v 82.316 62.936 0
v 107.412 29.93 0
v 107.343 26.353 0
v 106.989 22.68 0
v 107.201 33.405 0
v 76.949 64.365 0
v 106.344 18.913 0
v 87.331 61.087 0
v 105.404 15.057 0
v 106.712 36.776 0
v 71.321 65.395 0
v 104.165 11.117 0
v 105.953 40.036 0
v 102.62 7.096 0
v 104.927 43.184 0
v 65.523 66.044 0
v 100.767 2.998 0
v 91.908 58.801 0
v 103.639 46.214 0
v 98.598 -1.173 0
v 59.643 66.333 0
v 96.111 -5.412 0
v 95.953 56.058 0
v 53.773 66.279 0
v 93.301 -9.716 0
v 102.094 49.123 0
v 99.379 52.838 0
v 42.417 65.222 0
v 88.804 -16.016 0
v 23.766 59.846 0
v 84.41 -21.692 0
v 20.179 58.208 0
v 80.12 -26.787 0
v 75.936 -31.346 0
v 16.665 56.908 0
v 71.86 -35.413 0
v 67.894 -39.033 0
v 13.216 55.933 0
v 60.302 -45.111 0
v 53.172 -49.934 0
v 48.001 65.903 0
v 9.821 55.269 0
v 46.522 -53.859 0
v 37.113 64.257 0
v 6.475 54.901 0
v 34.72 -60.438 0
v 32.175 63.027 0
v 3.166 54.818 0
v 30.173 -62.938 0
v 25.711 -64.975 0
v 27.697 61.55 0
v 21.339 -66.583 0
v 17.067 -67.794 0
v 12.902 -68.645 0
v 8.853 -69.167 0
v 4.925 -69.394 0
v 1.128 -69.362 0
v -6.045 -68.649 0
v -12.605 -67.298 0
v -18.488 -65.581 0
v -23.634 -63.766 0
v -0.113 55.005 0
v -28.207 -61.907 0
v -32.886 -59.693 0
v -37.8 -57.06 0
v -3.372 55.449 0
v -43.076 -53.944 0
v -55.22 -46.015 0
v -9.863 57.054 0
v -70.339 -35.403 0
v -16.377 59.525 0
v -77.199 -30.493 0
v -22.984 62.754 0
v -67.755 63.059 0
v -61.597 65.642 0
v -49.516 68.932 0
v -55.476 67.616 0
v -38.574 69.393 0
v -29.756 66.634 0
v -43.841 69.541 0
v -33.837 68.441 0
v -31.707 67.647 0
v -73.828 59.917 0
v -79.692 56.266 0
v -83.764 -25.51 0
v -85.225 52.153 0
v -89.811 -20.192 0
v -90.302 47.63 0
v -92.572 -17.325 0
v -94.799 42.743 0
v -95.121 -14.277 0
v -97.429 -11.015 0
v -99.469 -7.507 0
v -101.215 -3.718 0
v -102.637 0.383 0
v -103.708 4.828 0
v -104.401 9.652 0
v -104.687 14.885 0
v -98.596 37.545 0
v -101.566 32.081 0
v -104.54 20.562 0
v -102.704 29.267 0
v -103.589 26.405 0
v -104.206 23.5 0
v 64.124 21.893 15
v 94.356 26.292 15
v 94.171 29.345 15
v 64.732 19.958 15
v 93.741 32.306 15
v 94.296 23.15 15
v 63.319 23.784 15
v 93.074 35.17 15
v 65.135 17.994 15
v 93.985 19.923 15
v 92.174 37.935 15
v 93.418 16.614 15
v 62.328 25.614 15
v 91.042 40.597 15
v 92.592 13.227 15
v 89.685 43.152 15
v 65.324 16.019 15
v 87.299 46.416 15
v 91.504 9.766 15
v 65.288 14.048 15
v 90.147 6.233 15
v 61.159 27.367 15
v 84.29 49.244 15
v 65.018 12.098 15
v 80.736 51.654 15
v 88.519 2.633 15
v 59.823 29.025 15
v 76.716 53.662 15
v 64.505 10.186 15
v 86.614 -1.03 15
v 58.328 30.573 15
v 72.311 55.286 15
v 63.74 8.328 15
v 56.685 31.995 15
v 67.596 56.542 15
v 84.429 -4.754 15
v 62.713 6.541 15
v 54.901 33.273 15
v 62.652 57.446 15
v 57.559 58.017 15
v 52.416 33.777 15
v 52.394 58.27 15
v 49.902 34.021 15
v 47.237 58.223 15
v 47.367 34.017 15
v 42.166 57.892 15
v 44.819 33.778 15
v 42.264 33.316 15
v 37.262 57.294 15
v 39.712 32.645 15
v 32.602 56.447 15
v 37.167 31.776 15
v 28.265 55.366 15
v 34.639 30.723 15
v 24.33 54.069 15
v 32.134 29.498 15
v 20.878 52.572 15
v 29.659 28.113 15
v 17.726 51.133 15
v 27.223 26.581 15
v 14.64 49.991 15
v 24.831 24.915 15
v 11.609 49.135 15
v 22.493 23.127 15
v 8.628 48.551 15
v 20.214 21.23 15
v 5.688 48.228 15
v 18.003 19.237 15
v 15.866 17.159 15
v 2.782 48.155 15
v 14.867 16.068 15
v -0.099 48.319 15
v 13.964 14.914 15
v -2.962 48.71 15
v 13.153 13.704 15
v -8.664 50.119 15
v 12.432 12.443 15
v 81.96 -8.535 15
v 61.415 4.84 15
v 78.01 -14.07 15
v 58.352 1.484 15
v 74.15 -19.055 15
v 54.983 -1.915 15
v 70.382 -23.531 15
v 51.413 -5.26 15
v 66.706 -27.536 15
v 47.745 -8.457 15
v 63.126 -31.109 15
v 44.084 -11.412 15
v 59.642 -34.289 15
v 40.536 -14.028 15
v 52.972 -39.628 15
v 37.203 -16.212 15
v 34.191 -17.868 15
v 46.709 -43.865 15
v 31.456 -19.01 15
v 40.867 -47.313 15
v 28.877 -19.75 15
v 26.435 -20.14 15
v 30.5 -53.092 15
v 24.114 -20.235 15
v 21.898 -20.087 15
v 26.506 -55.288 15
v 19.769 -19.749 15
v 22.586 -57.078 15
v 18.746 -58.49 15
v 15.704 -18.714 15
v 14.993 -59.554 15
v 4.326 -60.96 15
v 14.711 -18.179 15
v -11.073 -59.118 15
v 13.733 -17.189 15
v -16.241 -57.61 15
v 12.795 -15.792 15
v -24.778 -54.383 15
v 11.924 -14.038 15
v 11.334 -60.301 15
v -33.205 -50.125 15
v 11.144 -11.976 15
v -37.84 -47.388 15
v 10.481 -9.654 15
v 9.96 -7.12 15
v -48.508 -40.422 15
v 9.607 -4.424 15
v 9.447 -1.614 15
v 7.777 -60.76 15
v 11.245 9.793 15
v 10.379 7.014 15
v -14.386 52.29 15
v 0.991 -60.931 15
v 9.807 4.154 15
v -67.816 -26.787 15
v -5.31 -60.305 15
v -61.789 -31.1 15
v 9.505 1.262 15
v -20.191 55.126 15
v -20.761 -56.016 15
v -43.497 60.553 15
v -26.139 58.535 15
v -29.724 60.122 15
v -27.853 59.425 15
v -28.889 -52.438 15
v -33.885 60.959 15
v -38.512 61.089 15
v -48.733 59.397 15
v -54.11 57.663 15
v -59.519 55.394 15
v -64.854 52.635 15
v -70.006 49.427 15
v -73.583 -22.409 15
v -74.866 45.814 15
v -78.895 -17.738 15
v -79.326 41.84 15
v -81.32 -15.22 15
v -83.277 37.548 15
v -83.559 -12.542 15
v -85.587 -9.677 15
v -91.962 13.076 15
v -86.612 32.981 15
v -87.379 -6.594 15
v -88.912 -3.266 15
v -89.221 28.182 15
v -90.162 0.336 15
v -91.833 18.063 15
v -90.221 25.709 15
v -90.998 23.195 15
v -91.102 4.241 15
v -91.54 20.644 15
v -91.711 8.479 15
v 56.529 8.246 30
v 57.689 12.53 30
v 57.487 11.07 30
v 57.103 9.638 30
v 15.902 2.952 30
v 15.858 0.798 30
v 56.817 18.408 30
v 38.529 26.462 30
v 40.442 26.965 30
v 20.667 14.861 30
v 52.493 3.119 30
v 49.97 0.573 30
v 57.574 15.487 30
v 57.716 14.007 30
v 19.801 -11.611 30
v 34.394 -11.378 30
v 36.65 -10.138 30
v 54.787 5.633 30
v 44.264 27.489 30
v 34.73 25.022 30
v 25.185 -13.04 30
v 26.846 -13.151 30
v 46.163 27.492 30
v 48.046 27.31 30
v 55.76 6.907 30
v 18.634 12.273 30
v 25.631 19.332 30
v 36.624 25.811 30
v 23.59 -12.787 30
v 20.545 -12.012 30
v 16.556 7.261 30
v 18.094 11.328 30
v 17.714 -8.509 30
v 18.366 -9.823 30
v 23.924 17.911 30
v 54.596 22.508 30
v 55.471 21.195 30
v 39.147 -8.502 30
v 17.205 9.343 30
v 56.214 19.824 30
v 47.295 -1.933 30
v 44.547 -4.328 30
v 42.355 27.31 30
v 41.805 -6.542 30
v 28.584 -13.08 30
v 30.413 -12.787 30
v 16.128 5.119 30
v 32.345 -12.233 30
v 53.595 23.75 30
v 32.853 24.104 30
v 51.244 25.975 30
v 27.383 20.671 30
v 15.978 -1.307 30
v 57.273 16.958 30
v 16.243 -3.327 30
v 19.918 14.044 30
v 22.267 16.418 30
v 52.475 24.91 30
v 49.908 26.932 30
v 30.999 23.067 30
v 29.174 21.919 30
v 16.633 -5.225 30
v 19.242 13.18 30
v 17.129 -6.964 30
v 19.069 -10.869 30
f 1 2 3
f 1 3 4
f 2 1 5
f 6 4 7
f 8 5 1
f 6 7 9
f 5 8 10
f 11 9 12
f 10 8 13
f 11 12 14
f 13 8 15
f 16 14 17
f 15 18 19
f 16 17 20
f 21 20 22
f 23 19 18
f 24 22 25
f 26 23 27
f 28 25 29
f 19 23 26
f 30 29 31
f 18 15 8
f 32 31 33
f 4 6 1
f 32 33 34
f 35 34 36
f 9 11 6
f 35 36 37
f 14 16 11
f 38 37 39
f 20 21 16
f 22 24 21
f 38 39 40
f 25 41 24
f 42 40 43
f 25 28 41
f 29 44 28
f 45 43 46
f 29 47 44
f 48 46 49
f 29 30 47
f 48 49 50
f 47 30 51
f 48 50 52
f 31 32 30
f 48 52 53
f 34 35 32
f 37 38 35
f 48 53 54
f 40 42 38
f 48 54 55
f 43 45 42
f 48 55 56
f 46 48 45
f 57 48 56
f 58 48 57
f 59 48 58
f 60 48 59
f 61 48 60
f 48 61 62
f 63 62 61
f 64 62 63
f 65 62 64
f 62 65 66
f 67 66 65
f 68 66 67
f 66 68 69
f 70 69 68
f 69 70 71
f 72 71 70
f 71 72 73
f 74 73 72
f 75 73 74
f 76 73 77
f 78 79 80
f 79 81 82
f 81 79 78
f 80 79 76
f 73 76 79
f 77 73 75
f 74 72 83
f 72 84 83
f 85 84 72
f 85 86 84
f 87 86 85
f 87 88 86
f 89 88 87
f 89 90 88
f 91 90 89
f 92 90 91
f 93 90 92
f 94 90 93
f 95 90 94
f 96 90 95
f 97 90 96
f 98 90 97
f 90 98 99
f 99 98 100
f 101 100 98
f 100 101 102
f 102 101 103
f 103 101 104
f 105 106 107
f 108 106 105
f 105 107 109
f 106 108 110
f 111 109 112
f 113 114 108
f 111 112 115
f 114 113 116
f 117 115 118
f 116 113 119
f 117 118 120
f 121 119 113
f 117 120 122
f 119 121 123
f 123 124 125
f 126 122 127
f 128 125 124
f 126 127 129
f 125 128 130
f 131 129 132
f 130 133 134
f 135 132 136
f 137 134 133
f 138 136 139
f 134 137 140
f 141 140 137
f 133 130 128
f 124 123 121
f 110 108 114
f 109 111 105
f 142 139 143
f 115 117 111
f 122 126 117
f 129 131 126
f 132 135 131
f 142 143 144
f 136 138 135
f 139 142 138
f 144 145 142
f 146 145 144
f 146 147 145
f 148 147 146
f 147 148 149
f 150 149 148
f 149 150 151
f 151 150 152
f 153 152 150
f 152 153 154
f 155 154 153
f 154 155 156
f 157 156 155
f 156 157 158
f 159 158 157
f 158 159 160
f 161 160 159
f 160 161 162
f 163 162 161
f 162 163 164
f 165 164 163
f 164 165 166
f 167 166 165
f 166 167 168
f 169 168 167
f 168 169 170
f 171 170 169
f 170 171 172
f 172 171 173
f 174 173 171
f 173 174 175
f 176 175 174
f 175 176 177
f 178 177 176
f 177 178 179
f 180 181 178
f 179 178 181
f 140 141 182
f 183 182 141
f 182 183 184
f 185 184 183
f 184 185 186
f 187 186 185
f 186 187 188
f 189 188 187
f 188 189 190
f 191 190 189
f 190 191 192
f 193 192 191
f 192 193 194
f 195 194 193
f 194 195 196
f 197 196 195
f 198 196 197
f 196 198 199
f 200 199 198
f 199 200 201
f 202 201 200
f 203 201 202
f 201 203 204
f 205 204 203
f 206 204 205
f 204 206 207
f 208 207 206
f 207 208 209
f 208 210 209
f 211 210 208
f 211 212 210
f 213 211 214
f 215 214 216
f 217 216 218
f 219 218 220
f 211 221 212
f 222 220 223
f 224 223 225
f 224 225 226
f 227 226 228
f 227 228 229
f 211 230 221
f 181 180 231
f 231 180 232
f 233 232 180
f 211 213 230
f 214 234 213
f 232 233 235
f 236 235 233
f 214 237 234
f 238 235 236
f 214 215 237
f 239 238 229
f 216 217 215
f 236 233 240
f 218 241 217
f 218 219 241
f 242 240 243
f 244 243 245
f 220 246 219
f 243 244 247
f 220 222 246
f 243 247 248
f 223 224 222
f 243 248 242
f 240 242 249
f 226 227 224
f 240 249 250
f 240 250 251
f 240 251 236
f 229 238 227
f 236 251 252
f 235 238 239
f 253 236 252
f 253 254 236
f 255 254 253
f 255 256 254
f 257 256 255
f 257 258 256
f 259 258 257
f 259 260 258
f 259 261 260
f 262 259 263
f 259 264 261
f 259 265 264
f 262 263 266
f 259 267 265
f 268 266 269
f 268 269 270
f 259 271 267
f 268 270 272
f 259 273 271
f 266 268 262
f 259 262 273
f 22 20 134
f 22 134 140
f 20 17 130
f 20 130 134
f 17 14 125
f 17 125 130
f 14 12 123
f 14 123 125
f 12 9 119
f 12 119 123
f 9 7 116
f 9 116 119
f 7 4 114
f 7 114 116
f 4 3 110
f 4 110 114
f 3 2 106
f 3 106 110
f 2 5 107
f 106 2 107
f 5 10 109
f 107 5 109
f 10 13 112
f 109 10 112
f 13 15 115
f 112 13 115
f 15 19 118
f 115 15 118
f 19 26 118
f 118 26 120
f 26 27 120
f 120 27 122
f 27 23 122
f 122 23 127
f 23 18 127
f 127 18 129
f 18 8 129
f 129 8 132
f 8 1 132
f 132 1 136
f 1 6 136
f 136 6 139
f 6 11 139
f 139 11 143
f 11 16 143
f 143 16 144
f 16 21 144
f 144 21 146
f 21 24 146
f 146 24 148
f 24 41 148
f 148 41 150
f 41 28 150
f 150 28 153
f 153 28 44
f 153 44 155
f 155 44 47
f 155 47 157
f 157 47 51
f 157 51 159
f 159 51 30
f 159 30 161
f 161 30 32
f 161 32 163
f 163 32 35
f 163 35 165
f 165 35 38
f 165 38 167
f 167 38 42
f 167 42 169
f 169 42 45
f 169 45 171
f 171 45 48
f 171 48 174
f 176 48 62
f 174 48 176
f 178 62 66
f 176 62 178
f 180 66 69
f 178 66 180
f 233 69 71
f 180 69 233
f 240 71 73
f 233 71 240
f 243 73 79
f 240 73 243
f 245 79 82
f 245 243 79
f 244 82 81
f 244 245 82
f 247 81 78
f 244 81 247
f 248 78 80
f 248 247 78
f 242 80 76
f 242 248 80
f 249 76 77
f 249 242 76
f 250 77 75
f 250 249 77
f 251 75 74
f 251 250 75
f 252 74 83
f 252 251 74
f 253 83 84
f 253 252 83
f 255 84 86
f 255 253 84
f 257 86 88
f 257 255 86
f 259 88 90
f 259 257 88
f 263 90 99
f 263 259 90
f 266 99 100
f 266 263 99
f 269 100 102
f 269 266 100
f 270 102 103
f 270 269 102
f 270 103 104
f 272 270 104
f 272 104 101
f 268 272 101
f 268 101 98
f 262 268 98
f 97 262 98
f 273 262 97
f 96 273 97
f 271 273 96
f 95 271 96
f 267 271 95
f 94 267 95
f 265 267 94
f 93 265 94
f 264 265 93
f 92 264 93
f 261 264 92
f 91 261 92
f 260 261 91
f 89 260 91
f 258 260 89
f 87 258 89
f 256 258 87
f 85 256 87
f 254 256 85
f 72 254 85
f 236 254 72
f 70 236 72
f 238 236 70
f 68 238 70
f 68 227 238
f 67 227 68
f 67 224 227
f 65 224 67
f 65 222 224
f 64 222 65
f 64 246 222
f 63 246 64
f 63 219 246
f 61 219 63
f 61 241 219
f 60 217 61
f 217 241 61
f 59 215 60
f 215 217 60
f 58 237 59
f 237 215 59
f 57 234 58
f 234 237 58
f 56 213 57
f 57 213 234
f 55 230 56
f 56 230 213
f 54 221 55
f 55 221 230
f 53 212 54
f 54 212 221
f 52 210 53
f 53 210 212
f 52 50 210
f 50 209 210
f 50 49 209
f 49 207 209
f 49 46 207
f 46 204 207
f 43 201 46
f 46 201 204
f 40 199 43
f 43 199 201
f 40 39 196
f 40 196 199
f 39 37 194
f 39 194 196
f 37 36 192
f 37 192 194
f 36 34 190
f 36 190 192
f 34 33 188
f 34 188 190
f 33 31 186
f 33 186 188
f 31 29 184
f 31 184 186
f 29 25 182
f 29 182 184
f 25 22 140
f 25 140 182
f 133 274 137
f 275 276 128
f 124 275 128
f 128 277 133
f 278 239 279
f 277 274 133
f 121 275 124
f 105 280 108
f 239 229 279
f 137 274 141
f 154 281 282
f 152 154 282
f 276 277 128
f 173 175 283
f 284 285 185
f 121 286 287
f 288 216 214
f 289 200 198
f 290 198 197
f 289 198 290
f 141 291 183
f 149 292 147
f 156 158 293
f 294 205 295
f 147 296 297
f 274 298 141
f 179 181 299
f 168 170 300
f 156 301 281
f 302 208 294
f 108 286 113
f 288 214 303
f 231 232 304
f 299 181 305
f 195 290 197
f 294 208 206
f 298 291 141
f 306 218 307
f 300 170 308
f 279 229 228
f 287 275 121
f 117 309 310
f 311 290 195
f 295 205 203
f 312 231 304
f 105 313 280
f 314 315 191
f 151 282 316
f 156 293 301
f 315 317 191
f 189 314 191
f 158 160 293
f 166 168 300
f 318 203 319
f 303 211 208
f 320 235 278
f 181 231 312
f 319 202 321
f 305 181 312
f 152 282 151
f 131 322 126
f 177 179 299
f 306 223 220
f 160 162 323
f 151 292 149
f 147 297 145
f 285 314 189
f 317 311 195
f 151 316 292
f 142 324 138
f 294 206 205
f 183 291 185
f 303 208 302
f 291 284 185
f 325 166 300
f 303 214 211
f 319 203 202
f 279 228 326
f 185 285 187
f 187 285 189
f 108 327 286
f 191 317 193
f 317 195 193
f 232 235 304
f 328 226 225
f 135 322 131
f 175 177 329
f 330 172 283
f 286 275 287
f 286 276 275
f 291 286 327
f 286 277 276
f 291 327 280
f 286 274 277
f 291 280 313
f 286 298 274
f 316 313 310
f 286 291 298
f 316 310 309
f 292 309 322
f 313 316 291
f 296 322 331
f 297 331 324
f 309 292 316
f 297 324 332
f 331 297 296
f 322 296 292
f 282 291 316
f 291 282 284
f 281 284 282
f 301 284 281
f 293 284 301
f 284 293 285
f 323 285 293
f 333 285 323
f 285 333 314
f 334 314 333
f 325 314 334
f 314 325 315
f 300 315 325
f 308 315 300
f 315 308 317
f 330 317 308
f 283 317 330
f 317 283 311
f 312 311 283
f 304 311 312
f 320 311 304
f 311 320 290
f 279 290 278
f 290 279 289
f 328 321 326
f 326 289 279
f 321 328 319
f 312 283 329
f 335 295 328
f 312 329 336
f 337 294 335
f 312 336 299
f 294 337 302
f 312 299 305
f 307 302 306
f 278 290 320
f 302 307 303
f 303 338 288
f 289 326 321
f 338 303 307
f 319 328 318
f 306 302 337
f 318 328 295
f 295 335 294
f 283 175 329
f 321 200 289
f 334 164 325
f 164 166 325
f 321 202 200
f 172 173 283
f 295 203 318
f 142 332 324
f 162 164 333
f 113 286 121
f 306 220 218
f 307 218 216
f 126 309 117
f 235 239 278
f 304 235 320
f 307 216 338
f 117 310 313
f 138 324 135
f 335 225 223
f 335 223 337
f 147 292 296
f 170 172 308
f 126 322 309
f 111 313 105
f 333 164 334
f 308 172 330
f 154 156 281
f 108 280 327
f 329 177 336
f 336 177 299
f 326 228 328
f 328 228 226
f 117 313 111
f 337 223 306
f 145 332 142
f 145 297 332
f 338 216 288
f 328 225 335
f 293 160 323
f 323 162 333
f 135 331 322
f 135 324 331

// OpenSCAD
// file: hill-4.scad
use <hillpolygon.scad>

% translate([0,0,155/2]) cube(size=[240, 153, 155], center=true); 

hill4();

module hill4() {
   hillFromPolygon(angle=25) hill4Polygon();
}

// Note: There is something slightly amiss with this polygon, resulting hill ends up with two
//       volumes (?).
module hill4Polygon() {
   // Apologies for the hackish adjustments ... just wanted to get the job done!
   translate([-10,0,0]) rotate([0,0,55]) translate([75,-10,0]) scale([0.8,0.8]) 
      polygon(points=
         [[-140.478, 124.045], [-137.230, 125.810], [-133.814, 127.261],
         [-130.249, 128.407], [-126.551, 129.260], [-118.827, 130.135],
         [-110.782, 129.975], [-102.554, 128.873], [-94.282, 126.918],
         [-86.104, 124.202], [-78.161, 120.815], [-70.590, 116.849],
         [-63.530, 112.395], [-57.120, 107.543], [-51.500, 102.384],
         [-46.807, 97.010], [-43.182, 91.511], [-40.761, 85.978], [-40.047,
         83.228], [-39.685, 80.503], [-38.803, 70.788], [-37.372, 61.707],
         [-35.232, 53.266], [-32.221, 45.469], [-30.339, 41.813], [-28.180,
         38.321], [-25.722, 34.993], [-22.947, 31.830], [-19.833, 28.831],
         [-16.361, 25.998], [-12.511, 23.332], [-8.262, 20.833], [-3.699,
         18.030], [1.024, 14.503], [5.824, 10.330], [10.615, 5.590],
         [15.315, 0.361], [19.839, -5.279], [24.103, -11.252], [28.023,
         -17.479], [31.515, -23.882], [34.496, -30.382], [36.880, -36.903],
         [38.583, -43.364], [39.523, -49.689], [39.615, -55.798], [38.774,
         -61.614], [36.917, -67.058], [35.046, -70.725], [32.867, -74.217],
         [30.379, -77.524], [27.585, -80.639], [24.484, -83.556], [21.077,
         -86.264], [17.366, -88.758], [13.350, -91.029], [9.031, -93.069],
         [4.409, -94.871], [-0.514, -96.427], [-5.739, -97.729], [-11.264,
         -98.769], [-17.089, -99.539], [-23.213, -100.032], [-29.635,
         -100.240], [-39.310, -100.153], [-48.272, -99.722], [-56.565,
         -98.983], [-64.233, -97.967], [-71.320, -96.710], [-77.870,
         -95.245], [-89.537, -91.828], [-99.587, -87.986], [-108.374,
         -83.990], [-123.572, -76.623], [-129.392, -73.760], [-134.677,
         -70.651], [-139.458, -67.328], [-143.761, -63.822], [-147.618,
         -60.167], [-151.056, -56.395], [-154.105, -52.536], [-156.794,
         -48.625], [-161.207, -40.769], [-164.527, -33.084], [-166.987,
         -25.828], [-168.818, -19.258], [-170.193, -13.243], [-171.281,
         -6.864], [-172.108, 0.055], [-172.700, 7.691], [-173.288,
         25.811], [-173.262, 48.900], [-173.153, 59.445], [-172.757,
         69.740], [-171.648, 79.745], [-170.692, 84.627], [-169.398,
         89.422], [-167.713, 94.124], [-165.583, 98.729], [-162.955,
         103.233], [-159.776, 107.629], [-155.992, 111.913], [-151.550,
         116.081], [-146.396, 120.126], [-140.478, 124.045]]
      , paths=
         [[0, 1, 2, 3, 4, 5, 6, 7, 8, 9, 10, 11, 12, 13, 14, 15, 16, 17,
         18, 19, 20, 21, 22, 23, 24, 25, 26, 27, 28, 29, 30, 31, 32, 33,
         34, 35, 36, 37, 38, 39, 40, 41, 42, 43, 44, 45, 46, 47, 48, 49,
         50, 51, 52, 53, 54, 55, 56, 57, 58, 59, 60, 61, 62, 63, 64, 65,
         66, 67, 68, 69, 70, 71, 72, 73, 74, 75, 76, 77, 78, 79, 80, 81,
         82, 83, 84, 85, 86, 87, 88, 89, 90, 91, 92, 93, 94, 95, 96, 97,
         98, 99, 100, 101, 102, 103, 104, 0]]
    );}
// file: hill-5.scad
use <hillpolygon.scad>;

% translate([0,0,155/2]) cube(size=[240, 153, 155], center=true);

hill5();

module hill5() {
   hillFromPolygon(angle=25) hill5Polygon();
}

module hill5Polygon() {
	rotate([0,0,30]) translate([55,-15,0])
  polygon(points=
    [[-39.685, 80.503], [-33.602, 77.830], [-27.700, 74.829], [-22.013, 71.501], [-16.577, 67.848], [-11.425, 63.870], [-6.592, 59.569], [-2.114, 54.944], [1.976, 49.998], [5.642, 44.731], [8.851, 39.145], [11.567, 33.240], [13.756, 27.017], [15.384, 20.477], [16.415, 13.623], [16.815, 6.453], [16.549, -1.030], [14.055, -7.770], [11.144, -14.347], [7.855, -20.711], [4.224, -26.811], [0.290, -32.597], [-3.911, -38.020], [-8.340, -43.029], [-12.960, -47.574], [-17.734, -51.605], [-22.624, -55.073], [-27.593, -57.926], [-32.602, -60.115], [-37.615, -61.590], [-42.594, -62.300], [-47.502, -62.196], [-52.300, -61.228], [-61.971, -57.963], [-71.871, -53.933], [-81.720, -49.278], [-91.235, -44.137], [-100.137, -38.652], [-108.144, -32.964], [-114.977, -27.212], [-120.353, -21.538], [-124.325, -15.847], [-127.224, -9.973], [-129.190, -3.949], [-130.364, 2.191], [-130.884, 8.412], [-130.892, 14.682], [-129.929, 27.234], [-128.983, 30.724], [-126.888, 34.853], [-123.755, 39.481], [-119.698, 44.465], [-114.828, 49.664], [-109.258, 54.935], [-103.099, 60.138], [-96.463, 65.131], [-89.464, 69.772], [-82.212, 73.919], [-74.820, 77.431], [-67.400, 80.166], [-60.065, 81.982], [-52.926, 82.738], [-49.465, 82.674], [-46.095, 82.292], [-42.831, 81.574]]
    , paths=
    [[0, 1, 2, 3, 4, 5, 6, 7, 8, 9, 10, 11, 12, 13, 14, 15, 16, 17, 18, 19, 20, 21, 22, 23, 24, 25, 26, 27, 28, 29, 30, 31, 32, 33, 34, 35, 36, 37, 38, 39, 40, 41, 42, 43, 44, 45, 46, 47, 48, 49, 50, 51, 52, 53, 54, 55, 56, 57, 58, 59, 60, 61, 62, 63, 64, 0, 0]]
    );
}
// file: hillpolygon.scad
module hillFromPolygon(height = 23, angle = 30, convexity = 5) {
   $fn = 100;

   // estRadius calculates an estimated radius for the hill assuming that I've filled most of the
   // depth of the build plate (Y dimension) with the polygon. This is then used to scale the roof of
   // the polyhedral.
   estRadius = 0.95 * 150 / 2;
   inset = height * tan(angle);
   scaleFactor = (estRadius - inset) / estRadius;

   linear_extrude(height = height, convexity = convexity, scale=scaleFactor) child(0);
}
// main file
use <hillpolygon.scad>
use <hill-5.scad>
use <hill-4.scad>

% translate([0,0,155/2]) cube(size=[240, 153, 155], center=true); 

// cube([35,35,35,]);

hillFromPolygon(angle=30, height=15) hill4Polygon();


translate([35,8,15]) rotate([0,0,40]) scale([.45,.3,1]) hillFromPolygon(angle=50,height=15) hill5Polygon();
